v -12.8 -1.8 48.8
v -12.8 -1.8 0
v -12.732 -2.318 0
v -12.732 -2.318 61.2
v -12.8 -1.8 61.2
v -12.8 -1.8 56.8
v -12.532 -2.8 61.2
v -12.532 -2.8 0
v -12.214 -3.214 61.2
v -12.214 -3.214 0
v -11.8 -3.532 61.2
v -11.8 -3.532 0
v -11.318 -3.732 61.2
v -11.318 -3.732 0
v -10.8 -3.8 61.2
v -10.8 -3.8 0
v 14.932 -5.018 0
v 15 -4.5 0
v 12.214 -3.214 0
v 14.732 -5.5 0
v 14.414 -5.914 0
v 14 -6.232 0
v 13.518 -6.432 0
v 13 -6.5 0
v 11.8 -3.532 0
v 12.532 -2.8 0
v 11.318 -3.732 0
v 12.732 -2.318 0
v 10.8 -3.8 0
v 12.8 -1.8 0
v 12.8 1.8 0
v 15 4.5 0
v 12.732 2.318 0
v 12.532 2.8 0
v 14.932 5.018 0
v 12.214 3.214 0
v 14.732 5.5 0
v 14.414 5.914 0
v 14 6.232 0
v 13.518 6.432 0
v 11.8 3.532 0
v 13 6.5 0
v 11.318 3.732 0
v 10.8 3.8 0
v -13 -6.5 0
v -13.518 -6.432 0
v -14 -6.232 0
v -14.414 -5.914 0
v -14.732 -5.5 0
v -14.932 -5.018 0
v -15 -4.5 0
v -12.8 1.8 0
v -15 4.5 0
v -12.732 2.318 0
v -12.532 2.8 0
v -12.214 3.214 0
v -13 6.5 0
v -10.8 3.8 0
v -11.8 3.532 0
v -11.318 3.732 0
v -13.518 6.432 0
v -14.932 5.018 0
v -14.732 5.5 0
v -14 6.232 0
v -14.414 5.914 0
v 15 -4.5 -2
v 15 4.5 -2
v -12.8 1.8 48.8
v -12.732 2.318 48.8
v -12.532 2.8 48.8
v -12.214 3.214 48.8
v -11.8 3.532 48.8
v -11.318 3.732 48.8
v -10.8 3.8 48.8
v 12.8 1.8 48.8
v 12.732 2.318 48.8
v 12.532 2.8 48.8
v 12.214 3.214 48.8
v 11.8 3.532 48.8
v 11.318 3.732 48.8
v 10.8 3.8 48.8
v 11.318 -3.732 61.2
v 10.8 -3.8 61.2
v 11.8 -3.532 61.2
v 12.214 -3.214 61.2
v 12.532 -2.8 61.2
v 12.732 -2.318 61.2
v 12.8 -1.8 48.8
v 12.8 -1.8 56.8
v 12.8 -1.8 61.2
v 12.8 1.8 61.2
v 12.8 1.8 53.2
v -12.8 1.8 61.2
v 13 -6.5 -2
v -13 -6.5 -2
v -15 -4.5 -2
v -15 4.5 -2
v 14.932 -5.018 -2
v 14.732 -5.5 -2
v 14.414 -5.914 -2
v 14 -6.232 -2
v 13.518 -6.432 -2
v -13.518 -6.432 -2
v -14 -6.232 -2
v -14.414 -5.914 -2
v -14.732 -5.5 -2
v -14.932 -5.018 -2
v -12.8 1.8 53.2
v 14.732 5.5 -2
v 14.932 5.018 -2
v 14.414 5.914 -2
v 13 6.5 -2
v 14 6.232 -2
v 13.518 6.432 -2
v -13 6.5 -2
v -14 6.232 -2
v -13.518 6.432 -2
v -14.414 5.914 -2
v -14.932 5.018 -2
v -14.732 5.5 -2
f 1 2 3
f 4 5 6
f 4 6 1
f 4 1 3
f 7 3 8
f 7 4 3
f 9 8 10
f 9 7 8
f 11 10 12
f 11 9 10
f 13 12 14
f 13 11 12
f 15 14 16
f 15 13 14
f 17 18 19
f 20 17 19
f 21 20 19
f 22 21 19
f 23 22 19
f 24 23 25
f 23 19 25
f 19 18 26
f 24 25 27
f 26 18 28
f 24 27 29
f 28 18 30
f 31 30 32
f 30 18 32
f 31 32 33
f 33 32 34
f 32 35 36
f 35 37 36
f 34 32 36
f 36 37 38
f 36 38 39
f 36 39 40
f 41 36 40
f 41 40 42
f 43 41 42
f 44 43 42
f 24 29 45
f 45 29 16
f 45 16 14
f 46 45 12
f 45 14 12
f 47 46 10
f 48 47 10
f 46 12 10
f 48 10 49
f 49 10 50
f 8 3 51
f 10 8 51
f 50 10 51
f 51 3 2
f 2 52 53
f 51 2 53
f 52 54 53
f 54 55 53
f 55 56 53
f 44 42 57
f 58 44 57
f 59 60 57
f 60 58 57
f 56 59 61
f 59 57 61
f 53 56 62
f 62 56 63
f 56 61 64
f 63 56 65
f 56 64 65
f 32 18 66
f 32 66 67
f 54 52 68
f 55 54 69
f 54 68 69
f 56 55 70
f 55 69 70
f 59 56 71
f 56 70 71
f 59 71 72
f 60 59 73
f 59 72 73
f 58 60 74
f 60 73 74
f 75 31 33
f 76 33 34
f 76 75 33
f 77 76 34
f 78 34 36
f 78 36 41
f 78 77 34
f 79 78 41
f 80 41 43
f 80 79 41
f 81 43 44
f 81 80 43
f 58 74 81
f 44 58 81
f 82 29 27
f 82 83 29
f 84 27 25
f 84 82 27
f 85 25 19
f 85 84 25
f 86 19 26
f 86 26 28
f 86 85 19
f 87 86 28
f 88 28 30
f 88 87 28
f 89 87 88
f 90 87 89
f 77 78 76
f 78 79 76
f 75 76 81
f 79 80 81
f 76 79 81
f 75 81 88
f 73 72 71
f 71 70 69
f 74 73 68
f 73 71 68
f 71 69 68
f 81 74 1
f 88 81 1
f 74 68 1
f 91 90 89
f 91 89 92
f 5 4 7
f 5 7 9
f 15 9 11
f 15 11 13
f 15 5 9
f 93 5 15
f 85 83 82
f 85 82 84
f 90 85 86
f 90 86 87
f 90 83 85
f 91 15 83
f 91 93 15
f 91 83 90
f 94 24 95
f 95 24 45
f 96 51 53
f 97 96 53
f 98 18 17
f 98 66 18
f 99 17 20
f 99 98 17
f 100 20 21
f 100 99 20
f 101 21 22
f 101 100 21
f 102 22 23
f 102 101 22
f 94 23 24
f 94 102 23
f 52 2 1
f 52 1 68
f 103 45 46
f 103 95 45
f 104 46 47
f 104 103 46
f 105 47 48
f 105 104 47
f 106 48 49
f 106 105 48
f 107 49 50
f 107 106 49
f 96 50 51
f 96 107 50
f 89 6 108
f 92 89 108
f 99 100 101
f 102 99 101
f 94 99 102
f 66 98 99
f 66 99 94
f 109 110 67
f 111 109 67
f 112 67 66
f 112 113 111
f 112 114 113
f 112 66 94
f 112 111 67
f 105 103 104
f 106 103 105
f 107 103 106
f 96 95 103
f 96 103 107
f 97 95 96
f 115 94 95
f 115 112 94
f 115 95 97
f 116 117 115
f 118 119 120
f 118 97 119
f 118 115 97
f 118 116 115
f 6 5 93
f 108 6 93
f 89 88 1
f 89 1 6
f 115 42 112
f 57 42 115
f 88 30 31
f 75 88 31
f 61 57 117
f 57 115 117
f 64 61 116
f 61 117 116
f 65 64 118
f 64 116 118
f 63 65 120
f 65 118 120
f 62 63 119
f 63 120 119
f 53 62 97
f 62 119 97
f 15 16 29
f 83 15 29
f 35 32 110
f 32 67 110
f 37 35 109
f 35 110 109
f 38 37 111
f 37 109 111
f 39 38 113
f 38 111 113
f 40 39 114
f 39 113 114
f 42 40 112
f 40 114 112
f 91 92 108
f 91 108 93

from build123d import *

# Parameters (mm, degrees)
SKETCH1_W           = 25.6
SKETCH1_H           = 7.6
BOSS_EXTRUDE1_DEPTH = 61.2
FILLET1_R           = 2
SKETCH2_W           = 30
SKETCH2_H           = 13
BOSS_EXTRUDE2_DEPTH = 2
FILLET2_R           = 2
CUT_EXTRUDE1_DEPTH  = 25.6


with BuildPart() as part:
    # Sketch1 → Boss-Extrude1 (new body)
    with BuildSketch(Plane.XY):
        Rectangle(SKETCH1_W, SKETCH1_H)
    extrude(amount=BOSS_EXTRUDE1_DEPTH)

    # Fillet1
    fillet1_edges = [part.edges().sort_by_distance(p)[0] for p in [
        (12.8, -3.8, 30.6),
        (-12.8, -3.8, 30.6),
        (-12.8, 3.8, 30.6),
        (12.8, 3.8, 30.6),
    ]]
    fillet(fillet1_edges, radius=FILLET1_R)

    # Sketch2 → Boss-Extrude2 (add)
    with BuildSketch(Plane(origin=(0, 0, 0), x_dir=(-1, 0, 0), z_dir=(0, 0, -1))):
        Rectangle(SKETCH2_W, SKETCH2_H)
    extrude(amount=BOSS_EXTRUDE2_DEPTH)

    # Fillet2
    fillet2_edges = [part.edges().sort_by_distance(p)[0] for p in [
        (-15, -6.5, -1),
        (-15, 6.5, -1),
        (15, 6.5, -1),
        (15, -6.5, -1),
    ]]
    fillet(fillet2_edges, radius=FILLET2_R)

    # Sketch3 → Cut-Extrude1 (cut)
    with BuildSketch(Plane.ZY.offset(12.8)):
        Polygon((48.8, -1.8), (56.8, -1.8), (53.2, 1.8), (61.2, 1.8), (61.2, 3.8), (48.8, 3.8), align=None)
    extrude(amount=-CUT_EXTRUDE1_DEPTH, mode=Mode.SUBTRACT)


solid = part.part
